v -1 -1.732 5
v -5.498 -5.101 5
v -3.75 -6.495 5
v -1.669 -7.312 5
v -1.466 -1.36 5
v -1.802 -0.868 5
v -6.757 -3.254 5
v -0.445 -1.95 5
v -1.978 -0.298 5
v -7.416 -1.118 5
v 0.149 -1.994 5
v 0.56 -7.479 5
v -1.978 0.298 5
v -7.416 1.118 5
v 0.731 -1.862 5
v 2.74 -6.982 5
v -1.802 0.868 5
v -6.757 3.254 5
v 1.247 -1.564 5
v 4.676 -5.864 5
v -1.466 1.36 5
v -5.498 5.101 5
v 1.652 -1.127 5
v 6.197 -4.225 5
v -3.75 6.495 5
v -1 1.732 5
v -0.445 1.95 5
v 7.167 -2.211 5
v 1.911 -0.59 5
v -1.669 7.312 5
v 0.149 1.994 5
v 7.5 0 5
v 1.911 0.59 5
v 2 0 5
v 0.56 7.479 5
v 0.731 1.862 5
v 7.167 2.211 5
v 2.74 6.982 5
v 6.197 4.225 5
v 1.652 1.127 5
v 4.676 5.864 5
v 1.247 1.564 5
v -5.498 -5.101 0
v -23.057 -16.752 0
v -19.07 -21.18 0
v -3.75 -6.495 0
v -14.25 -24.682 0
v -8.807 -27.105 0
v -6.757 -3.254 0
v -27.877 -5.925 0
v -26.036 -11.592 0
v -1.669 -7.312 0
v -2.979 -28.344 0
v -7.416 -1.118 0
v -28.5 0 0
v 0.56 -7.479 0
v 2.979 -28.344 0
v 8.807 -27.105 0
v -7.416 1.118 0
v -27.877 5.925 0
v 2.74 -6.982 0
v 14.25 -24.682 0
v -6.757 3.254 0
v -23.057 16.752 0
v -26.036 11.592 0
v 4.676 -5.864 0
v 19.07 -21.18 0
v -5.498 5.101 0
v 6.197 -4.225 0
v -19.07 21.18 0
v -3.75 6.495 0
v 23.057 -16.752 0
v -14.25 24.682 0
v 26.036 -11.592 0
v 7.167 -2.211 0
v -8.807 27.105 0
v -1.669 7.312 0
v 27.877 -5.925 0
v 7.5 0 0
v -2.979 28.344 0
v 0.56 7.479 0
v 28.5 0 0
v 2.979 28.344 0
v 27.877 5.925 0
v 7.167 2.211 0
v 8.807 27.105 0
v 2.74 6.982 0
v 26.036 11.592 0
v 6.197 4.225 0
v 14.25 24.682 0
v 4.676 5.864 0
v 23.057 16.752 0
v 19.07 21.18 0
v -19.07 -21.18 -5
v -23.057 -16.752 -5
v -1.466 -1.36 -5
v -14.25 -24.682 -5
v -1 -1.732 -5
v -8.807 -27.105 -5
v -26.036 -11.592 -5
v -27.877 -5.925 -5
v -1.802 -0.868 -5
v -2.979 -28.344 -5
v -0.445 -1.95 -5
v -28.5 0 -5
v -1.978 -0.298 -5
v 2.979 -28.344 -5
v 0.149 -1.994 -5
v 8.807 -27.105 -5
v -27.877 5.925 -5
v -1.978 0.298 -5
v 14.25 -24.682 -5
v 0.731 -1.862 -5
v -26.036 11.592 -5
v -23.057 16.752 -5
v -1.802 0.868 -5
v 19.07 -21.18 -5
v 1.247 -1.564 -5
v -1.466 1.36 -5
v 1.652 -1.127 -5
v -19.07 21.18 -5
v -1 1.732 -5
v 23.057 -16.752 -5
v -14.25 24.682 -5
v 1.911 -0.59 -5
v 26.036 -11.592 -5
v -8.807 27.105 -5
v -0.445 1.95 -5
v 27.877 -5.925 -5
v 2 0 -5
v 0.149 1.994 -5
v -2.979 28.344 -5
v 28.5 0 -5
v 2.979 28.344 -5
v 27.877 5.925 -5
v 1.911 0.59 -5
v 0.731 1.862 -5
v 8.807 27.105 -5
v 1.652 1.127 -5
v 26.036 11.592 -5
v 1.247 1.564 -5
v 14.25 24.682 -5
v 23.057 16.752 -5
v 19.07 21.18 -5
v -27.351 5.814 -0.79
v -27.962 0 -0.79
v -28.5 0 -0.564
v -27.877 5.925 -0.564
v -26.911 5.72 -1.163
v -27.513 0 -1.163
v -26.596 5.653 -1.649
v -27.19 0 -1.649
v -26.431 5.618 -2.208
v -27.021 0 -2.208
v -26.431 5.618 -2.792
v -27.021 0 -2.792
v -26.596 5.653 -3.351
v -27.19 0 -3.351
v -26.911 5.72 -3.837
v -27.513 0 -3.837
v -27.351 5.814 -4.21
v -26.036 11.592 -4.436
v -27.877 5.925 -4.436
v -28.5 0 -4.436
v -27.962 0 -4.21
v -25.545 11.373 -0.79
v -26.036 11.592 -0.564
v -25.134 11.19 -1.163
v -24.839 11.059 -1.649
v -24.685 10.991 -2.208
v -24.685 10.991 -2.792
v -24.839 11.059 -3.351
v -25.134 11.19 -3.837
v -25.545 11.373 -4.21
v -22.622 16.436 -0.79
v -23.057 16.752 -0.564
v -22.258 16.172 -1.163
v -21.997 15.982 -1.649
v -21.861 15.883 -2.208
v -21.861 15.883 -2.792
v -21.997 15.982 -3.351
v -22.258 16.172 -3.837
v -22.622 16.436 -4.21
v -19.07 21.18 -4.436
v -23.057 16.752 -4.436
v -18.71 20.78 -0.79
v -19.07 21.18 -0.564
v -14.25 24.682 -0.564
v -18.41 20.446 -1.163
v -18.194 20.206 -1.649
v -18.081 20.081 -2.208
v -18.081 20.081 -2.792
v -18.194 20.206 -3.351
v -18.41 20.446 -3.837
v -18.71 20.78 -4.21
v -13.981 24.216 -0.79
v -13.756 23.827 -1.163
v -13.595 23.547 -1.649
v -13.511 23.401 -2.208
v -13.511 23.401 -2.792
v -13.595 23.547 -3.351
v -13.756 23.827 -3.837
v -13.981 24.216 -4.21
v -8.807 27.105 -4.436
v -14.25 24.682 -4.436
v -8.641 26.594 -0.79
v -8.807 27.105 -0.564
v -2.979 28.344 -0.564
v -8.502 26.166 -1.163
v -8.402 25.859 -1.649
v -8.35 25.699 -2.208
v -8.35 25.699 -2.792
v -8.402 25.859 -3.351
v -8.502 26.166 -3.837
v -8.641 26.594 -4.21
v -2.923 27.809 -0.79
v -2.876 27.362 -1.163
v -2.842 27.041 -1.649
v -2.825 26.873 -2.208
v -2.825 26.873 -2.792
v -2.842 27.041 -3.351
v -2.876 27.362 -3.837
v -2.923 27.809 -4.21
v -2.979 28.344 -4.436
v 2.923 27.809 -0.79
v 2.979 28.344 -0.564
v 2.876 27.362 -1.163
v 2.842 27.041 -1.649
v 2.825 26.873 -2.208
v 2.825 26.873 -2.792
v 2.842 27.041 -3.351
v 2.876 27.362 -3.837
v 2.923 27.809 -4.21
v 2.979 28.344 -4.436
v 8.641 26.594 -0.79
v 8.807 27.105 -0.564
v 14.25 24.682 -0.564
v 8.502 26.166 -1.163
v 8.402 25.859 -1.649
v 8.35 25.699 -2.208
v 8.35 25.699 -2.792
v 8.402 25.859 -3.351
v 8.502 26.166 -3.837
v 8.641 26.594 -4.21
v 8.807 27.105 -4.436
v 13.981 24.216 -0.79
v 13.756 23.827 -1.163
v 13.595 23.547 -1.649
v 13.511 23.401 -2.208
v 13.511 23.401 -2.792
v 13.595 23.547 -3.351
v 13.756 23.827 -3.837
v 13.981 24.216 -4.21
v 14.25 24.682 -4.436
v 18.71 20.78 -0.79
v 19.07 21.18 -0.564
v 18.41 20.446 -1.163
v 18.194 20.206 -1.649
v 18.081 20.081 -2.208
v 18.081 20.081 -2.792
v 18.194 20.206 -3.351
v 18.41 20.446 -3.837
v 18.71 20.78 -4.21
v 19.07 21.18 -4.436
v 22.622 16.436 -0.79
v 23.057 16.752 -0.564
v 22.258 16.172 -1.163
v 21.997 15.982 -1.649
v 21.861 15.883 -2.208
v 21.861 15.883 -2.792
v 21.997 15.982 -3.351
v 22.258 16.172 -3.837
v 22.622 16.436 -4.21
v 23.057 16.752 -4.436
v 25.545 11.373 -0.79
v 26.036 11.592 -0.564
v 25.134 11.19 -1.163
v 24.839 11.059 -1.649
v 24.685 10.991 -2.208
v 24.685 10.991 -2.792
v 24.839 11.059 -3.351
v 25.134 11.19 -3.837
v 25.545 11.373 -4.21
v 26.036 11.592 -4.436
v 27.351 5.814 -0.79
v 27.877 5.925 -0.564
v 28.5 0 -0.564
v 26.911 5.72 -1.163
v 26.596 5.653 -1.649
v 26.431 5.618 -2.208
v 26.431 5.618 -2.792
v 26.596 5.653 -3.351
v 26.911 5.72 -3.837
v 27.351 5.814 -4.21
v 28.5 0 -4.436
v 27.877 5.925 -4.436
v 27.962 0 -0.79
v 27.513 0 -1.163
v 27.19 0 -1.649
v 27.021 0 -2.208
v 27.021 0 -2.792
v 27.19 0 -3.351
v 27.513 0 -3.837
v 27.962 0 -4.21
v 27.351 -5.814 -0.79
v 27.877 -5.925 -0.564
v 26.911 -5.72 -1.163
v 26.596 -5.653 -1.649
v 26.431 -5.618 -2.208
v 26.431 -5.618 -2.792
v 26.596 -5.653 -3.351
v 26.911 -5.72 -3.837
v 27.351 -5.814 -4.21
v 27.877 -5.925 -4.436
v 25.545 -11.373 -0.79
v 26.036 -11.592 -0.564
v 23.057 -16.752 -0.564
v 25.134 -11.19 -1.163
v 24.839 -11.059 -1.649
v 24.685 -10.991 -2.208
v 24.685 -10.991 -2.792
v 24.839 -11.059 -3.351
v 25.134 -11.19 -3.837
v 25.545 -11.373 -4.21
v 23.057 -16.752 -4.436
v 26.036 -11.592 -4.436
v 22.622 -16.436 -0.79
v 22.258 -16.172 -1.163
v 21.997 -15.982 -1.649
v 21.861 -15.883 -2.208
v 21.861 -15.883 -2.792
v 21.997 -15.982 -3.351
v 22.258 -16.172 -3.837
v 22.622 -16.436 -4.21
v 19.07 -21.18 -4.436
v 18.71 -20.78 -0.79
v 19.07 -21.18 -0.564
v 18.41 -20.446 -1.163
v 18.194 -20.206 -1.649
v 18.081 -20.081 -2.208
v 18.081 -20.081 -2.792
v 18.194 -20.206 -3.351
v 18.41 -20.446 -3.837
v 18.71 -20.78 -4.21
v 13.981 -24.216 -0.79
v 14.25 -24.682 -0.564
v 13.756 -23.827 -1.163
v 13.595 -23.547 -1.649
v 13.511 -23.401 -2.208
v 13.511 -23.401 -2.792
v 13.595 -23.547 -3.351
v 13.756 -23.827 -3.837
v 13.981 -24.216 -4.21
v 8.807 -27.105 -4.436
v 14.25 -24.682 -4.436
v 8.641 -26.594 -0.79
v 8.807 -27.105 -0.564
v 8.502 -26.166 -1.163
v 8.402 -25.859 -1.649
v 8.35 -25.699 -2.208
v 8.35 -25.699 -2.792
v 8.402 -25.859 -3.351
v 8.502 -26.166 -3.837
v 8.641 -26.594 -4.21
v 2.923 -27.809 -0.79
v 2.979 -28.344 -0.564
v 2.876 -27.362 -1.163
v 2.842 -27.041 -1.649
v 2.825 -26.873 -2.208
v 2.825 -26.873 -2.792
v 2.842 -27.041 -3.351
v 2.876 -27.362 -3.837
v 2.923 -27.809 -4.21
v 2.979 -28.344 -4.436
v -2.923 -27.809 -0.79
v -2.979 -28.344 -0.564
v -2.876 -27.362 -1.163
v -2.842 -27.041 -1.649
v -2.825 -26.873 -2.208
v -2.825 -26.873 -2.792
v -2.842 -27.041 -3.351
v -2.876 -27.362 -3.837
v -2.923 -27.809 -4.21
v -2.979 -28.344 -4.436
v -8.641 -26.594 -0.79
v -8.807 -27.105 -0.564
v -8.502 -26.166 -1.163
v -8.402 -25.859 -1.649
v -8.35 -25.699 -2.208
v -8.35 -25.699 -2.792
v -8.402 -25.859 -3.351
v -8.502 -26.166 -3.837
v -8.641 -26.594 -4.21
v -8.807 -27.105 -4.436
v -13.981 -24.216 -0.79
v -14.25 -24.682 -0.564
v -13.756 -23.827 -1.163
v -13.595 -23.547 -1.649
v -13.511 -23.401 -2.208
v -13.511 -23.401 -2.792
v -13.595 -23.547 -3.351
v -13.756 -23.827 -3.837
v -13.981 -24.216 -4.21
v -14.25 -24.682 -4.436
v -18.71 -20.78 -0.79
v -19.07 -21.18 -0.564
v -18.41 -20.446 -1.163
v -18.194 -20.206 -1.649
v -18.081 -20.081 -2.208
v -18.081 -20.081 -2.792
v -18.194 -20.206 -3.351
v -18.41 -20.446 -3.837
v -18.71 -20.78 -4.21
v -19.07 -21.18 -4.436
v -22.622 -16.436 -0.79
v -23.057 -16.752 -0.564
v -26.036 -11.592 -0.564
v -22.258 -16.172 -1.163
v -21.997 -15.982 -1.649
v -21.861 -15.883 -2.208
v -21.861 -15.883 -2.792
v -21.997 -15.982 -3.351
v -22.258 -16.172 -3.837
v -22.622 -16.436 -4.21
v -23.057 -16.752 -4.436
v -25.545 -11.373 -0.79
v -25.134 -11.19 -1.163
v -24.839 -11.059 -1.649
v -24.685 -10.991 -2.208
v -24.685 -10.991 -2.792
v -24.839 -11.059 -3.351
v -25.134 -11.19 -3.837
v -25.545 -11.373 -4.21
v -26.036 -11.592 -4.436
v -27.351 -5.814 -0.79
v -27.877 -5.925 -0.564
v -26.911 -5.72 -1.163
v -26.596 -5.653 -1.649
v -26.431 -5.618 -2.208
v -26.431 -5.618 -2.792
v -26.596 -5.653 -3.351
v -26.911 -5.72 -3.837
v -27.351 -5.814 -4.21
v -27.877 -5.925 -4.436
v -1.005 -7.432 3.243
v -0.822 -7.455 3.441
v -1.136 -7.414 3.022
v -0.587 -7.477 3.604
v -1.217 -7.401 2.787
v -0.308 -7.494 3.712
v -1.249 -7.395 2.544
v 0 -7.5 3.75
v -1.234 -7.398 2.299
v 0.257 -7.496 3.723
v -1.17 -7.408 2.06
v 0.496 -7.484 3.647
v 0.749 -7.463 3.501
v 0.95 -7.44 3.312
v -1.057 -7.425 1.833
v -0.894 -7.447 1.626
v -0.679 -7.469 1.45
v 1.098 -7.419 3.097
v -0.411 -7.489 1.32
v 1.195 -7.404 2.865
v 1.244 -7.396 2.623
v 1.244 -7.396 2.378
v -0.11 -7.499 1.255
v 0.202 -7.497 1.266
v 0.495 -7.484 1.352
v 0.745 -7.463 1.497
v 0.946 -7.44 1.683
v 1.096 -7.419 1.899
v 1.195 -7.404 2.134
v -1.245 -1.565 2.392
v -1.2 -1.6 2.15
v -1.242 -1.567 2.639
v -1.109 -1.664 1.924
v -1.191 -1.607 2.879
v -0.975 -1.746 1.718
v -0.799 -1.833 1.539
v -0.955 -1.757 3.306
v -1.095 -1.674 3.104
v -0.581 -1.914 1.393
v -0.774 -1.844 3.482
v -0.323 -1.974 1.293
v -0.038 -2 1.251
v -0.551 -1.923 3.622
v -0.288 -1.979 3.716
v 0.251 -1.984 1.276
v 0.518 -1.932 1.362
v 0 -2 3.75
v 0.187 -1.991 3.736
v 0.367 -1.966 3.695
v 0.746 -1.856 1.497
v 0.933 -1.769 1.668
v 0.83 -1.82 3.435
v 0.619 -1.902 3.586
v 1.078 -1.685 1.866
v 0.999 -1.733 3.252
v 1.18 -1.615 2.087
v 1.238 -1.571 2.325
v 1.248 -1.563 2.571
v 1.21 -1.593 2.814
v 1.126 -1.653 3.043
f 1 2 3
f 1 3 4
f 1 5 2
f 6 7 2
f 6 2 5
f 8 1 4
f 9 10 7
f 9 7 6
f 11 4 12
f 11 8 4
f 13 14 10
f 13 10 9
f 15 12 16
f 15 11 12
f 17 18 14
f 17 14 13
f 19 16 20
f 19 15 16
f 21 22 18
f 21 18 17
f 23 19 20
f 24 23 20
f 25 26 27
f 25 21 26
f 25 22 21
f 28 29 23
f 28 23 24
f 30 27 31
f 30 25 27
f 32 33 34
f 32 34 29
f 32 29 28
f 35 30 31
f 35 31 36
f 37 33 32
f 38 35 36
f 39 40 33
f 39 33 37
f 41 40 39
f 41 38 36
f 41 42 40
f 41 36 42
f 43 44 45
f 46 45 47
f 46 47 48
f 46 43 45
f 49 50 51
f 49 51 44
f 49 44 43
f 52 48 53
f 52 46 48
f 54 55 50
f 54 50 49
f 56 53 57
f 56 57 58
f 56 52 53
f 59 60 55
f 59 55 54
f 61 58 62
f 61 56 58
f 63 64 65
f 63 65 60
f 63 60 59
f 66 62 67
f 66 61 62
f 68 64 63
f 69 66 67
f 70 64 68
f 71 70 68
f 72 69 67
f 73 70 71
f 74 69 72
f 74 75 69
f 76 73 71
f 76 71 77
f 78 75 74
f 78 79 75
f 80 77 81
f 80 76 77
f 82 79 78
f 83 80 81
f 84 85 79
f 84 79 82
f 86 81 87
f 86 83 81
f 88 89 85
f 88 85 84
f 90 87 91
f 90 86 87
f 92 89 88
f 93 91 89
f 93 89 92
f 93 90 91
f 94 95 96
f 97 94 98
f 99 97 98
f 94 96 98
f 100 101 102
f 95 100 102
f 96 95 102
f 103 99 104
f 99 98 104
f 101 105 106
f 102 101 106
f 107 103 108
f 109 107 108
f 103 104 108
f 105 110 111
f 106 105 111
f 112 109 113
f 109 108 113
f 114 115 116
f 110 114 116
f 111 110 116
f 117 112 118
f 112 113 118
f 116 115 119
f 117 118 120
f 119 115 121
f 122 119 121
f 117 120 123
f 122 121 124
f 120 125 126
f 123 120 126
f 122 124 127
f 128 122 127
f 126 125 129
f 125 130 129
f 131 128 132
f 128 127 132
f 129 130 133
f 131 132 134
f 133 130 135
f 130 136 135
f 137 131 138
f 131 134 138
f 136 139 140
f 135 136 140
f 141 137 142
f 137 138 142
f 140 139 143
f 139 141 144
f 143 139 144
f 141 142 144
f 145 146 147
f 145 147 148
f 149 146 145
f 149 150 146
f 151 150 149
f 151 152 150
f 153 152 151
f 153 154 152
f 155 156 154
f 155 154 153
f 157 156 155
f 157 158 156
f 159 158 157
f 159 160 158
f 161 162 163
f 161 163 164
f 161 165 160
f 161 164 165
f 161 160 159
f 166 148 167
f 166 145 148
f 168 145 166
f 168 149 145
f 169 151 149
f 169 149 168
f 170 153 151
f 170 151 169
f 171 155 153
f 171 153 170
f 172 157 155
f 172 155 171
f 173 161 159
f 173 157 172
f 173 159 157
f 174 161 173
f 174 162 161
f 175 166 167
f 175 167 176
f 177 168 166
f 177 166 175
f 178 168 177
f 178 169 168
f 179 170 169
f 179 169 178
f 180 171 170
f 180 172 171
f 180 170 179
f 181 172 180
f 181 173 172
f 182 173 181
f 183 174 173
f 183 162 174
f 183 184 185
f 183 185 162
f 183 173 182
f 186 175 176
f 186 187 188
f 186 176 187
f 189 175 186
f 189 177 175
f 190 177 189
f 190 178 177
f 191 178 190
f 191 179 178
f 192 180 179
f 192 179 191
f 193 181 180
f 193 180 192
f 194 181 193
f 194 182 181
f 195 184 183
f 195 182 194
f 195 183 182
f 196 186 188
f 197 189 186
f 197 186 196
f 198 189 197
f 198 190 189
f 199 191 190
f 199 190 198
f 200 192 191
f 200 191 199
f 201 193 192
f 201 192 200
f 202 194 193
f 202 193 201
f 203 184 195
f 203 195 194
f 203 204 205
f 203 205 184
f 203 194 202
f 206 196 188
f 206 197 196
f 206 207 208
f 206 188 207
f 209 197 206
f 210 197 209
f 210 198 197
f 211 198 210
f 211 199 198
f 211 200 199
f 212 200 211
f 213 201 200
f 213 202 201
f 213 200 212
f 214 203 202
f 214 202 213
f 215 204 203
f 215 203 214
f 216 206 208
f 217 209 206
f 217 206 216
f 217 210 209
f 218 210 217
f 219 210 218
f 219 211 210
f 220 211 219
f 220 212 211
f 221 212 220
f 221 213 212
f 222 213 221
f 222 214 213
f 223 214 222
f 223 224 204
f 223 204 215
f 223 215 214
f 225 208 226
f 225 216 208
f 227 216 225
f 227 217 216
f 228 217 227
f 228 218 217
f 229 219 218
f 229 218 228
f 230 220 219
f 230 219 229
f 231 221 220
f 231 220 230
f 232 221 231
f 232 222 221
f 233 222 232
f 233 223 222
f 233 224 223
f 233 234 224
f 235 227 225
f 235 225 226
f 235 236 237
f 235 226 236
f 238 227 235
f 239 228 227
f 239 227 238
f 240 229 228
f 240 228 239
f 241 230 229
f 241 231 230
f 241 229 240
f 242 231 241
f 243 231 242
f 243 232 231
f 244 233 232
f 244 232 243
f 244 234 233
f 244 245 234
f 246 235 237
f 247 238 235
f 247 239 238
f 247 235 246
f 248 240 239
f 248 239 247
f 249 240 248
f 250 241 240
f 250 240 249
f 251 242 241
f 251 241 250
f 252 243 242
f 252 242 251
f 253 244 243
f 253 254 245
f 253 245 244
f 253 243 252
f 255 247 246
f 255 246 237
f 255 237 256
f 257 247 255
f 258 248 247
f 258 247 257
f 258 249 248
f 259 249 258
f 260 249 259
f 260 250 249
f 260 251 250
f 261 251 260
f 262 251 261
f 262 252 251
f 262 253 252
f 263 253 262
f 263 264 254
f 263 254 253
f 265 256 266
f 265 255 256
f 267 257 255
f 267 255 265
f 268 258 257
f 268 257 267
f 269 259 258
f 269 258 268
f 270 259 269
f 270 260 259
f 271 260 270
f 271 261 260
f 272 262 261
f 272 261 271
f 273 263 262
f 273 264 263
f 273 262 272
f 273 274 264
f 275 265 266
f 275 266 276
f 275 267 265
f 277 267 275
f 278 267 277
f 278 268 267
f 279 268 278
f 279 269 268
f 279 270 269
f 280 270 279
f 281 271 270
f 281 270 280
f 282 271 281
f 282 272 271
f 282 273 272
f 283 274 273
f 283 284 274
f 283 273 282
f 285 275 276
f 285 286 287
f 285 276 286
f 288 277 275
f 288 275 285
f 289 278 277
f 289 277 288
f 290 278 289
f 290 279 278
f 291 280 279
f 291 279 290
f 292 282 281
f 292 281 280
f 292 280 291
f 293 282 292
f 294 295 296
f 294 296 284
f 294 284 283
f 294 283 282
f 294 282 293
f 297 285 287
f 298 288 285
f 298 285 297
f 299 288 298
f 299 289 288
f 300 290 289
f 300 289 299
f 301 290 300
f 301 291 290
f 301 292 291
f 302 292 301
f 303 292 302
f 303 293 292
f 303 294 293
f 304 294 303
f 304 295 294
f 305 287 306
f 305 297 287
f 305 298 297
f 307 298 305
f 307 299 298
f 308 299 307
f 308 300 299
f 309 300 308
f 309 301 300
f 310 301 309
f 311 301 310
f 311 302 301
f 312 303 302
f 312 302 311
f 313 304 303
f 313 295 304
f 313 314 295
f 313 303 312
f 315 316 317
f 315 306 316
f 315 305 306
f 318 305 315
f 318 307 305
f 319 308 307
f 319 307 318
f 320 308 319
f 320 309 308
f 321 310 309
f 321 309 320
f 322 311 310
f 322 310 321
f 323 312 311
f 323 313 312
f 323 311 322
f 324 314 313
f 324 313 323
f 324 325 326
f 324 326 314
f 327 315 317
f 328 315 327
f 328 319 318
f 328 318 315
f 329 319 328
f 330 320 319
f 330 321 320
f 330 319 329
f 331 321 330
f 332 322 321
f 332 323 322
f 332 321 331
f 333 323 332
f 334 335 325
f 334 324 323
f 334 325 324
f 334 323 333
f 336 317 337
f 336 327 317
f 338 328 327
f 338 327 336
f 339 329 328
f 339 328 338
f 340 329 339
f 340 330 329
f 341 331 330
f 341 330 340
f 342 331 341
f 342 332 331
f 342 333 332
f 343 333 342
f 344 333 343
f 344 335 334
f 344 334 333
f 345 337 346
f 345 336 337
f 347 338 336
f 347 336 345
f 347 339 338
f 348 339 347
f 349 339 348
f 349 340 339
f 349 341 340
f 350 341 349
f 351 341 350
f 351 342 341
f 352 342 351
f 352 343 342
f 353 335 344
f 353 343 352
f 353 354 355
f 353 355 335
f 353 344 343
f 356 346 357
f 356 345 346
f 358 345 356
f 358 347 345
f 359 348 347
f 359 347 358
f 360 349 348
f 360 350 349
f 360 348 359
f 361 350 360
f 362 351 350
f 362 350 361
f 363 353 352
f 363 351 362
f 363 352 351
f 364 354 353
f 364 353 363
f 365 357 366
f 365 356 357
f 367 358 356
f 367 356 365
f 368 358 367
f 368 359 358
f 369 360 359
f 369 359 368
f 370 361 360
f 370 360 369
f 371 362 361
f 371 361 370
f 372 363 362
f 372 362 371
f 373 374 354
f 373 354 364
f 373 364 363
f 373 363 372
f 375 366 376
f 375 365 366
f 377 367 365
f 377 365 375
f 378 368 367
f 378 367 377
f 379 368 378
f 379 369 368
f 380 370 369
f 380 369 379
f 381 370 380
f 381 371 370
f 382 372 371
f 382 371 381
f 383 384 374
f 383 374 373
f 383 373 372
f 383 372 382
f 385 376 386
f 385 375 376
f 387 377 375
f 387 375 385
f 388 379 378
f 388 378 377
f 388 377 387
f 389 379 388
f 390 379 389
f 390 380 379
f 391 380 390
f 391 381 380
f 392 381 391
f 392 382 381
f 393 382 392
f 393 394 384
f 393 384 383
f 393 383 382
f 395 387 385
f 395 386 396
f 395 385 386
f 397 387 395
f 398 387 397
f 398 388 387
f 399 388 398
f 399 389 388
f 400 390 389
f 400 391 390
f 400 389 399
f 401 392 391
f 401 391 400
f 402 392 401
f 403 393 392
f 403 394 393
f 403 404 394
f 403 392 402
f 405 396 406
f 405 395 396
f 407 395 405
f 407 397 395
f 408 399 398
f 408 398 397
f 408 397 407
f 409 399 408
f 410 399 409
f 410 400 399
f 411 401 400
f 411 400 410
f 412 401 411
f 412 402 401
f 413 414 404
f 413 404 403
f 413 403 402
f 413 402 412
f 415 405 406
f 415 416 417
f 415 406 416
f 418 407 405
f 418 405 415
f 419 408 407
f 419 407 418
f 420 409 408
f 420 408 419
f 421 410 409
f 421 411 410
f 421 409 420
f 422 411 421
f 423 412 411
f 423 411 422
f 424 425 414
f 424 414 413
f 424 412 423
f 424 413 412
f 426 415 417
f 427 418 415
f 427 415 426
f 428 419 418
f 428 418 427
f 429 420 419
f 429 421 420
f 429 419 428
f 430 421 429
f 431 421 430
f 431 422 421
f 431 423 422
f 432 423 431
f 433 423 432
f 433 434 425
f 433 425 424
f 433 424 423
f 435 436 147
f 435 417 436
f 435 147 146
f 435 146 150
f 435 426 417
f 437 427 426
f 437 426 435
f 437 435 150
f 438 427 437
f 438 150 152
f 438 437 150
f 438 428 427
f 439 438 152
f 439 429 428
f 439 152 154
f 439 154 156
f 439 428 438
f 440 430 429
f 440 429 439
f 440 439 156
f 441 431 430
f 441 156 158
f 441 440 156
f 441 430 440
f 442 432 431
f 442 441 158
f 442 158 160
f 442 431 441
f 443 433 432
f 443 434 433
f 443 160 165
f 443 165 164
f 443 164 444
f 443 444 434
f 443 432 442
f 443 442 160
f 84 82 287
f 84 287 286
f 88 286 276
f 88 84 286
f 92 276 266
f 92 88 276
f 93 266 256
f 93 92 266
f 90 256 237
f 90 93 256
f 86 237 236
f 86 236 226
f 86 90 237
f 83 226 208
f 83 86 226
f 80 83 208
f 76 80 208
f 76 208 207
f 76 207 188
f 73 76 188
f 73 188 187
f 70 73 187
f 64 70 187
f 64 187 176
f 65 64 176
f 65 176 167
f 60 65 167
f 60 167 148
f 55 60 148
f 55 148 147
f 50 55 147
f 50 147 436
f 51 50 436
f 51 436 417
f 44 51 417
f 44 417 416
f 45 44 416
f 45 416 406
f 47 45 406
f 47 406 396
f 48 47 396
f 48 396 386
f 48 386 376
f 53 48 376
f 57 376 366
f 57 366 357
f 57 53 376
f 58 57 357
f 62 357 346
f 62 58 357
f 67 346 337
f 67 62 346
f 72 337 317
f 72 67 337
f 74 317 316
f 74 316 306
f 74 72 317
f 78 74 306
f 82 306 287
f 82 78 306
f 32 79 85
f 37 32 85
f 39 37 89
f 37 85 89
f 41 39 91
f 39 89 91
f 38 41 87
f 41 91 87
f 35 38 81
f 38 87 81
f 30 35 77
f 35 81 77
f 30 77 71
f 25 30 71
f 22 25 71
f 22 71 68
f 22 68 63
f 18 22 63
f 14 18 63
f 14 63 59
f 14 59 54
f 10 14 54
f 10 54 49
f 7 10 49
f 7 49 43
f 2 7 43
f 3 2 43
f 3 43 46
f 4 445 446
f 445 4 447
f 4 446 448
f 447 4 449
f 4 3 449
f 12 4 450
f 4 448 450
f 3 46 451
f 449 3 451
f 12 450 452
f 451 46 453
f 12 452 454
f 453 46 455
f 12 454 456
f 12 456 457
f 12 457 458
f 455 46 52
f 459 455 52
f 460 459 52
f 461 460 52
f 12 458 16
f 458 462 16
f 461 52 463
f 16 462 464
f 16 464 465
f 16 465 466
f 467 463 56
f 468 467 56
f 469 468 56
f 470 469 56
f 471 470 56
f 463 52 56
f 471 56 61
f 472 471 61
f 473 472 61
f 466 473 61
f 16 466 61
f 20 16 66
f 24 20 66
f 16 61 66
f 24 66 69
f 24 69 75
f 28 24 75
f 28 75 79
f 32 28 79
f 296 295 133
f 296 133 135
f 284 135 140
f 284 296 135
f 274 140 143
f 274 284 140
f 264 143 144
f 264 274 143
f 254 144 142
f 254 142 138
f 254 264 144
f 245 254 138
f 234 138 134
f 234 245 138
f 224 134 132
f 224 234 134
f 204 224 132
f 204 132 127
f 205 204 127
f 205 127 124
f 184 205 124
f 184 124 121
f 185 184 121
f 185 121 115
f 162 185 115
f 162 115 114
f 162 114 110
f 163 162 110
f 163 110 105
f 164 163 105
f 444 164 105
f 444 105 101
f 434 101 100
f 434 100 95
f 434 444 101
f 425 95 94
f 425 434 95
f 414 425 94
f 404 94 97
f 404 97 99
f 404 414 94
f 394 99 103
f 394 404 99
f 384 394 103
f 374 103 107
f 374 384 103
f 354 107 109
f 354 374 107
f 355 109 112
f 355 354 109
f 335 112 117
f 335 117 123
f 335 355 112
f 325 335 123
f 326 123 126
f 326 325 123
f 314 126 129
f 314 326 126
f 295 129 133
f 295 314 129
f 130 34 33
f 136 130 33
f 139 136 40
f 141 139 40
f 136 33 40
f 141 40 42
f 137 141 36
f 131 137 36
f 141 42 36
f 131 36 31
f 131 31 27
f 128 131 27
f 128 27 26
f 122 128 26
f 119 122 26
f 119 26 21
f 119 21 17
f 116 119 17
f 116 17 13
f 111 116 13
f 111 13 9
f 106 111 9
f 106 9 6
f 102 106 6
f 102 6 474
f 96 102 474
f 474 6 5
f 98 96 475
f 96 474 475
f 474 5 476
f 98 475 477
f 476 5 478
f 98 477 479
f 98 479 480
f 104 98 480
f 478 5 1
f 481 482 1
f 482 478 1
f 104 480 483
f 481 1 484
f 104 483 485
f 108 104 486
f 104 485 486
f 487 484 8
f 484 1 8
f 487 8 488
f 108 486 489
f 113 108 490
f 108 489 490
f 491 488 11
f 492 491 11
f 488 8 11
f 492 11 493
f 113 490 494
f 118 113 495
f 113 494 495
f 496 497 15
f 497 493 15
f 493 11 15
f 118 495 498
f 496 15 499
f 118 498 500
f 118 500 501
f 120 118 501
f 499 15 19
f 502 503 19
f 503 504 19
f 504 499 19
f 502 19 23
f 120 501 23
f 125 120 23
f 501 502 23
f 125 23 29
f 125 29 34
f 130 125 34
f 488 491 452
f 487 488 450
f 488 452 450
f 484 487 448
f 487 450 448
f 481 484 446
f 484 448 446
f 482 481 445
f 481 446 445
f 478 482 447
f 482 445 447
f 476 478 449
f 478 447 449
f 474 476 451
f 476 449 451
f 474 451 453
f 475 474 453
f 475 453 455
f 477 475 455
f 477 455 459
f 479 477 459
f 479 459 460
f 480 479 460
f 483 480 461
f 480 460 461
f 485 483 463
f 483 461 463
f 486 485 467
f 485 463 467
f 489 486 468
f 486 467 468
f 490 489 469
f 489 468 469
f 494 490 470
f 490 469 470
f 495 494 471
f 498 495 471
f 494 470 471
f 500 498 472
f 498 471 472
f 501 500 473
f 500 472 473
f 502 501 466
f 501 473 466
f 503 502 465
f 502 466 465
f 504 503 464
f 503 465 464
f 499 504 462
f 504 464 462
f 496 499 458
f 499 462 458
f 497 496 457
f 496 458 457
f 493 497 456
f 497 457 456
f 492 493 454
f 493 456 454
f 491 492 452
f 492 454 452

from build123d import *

# Parameters (mm, degrees)
ESQUISSE1_R      = 28.5
EXTRUSION1_DEPTH = 5
ESQUISSE2_R      = 7.5
EXTRUSION2_DEPTH = 5
EXTRUSION3_REACH = 12
ESQUISSE3_R      = 2
ESQUISSE12_W     = 1.25
ESQUISSE12_H     = 28.5


with BuildPart() as part:
    # Esquisse1 → Extrusion1 (new body)
    with BuildSketch(Plane.XY):
        Circle(ESQUISSE1_R)
    extrude(amount=-EXTRUSION1_DEPTH)

    # Esquisse2 → Extrusion2 (add)
    with BuildSketch(Plane.XY):
        Circle(ESQUISSE2_R)
    extrude(amount=EXTRUSION2_DEPTH)

    # Esquisse3 → Extrusion3 (cut, up to next)
    with BuildSketch(Plane.XY.offset(5), mode=Mode.PRIVATE) as extrusion3_sk1:
        Circle(ESQUISSE3_R)
    extrusion3_tool1 = extrude(extrusion3_sk1.sketch, amount=-EXTRUSION3_REACH, mode=Mode.PRIVATE) & part.part
    add(extrusion3_tool1.solids().sort_by_distance((0, 0, 5))[0], mode=Mode.SUBTRACT)

    # Esquisse6 → Enlèvement de matière-Révolution3 (revolve, cut)
    with BuildSketch(Plane(origin=(0, 0, 0), x_dir=(1, 0, 0), z_dir=(0, 1, 0))):
        with BuildLine():
            Line((-29, 4.5), (-31.449617094, 4.5))
            Line((-31.449617094, 4.5), (-31.449617094, 0.5))
            Line((-31.449617094, 0.5), (-29, 0.5))
            ThreePointArc((-29, 0.5), (-27, 2.5), (-29, 4.5))
        make_face()
    revolve(axis=Axis((0, 0, 5), (0, 0, -1)), mode=Mode.SUBTRACT)

    # Esquisse12 → Trou taraudé M3x0.55 (revolve, cut)
    with BuildSketch(Plane(origin=(0, 0, 2.5), x_dir=(0, 0, 1), z_dir=(1, 0, 0))):
        with Locations((0.625, 14.25)):
            Rectangle(ESQUISSE12_W, ESQUISSE12_H)
    revolve(axis=Axis((0, 6.35, 2.5), (0, -1, 0)), mode=Mode.SUBTRACT)


solid = part.part
